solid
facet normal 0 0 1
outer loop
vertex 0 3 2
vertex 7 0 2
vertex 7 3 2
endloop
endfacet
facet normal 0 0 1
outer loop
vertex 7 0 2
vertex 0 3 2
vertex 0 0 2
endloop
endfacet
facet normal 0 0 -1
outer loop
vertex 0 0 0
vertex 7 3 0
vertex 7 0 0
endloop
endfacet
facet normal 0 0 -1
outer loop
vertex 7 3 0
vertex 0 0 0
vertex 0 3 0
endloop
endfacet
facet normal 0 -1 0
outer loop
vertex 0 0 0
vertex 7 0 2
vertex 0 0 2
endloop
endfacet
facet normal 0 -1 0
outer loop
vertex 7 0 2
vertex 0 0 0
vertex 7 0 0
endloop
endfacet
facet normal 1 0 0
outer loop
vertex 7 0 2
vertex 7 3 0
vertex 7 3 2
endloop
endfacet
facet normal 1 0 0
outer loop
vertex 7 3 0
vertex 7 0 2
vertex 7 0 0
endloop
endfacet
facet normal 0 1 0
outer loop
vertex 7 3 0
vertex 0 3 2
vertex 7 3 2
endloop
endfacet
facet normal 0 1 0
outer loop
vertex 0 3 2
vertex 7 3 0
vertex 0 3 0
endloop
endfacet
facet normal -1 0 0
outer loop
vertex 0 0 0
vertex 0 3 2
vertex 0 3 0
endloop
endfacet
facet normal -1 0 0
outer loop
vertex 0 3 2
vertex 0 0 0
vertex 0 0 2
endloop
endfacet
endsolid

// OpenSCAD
module testq (b,c,r) {
	cube([r,b,c]);
	
	}
	
	testq(b=3,c=2,r=7);
